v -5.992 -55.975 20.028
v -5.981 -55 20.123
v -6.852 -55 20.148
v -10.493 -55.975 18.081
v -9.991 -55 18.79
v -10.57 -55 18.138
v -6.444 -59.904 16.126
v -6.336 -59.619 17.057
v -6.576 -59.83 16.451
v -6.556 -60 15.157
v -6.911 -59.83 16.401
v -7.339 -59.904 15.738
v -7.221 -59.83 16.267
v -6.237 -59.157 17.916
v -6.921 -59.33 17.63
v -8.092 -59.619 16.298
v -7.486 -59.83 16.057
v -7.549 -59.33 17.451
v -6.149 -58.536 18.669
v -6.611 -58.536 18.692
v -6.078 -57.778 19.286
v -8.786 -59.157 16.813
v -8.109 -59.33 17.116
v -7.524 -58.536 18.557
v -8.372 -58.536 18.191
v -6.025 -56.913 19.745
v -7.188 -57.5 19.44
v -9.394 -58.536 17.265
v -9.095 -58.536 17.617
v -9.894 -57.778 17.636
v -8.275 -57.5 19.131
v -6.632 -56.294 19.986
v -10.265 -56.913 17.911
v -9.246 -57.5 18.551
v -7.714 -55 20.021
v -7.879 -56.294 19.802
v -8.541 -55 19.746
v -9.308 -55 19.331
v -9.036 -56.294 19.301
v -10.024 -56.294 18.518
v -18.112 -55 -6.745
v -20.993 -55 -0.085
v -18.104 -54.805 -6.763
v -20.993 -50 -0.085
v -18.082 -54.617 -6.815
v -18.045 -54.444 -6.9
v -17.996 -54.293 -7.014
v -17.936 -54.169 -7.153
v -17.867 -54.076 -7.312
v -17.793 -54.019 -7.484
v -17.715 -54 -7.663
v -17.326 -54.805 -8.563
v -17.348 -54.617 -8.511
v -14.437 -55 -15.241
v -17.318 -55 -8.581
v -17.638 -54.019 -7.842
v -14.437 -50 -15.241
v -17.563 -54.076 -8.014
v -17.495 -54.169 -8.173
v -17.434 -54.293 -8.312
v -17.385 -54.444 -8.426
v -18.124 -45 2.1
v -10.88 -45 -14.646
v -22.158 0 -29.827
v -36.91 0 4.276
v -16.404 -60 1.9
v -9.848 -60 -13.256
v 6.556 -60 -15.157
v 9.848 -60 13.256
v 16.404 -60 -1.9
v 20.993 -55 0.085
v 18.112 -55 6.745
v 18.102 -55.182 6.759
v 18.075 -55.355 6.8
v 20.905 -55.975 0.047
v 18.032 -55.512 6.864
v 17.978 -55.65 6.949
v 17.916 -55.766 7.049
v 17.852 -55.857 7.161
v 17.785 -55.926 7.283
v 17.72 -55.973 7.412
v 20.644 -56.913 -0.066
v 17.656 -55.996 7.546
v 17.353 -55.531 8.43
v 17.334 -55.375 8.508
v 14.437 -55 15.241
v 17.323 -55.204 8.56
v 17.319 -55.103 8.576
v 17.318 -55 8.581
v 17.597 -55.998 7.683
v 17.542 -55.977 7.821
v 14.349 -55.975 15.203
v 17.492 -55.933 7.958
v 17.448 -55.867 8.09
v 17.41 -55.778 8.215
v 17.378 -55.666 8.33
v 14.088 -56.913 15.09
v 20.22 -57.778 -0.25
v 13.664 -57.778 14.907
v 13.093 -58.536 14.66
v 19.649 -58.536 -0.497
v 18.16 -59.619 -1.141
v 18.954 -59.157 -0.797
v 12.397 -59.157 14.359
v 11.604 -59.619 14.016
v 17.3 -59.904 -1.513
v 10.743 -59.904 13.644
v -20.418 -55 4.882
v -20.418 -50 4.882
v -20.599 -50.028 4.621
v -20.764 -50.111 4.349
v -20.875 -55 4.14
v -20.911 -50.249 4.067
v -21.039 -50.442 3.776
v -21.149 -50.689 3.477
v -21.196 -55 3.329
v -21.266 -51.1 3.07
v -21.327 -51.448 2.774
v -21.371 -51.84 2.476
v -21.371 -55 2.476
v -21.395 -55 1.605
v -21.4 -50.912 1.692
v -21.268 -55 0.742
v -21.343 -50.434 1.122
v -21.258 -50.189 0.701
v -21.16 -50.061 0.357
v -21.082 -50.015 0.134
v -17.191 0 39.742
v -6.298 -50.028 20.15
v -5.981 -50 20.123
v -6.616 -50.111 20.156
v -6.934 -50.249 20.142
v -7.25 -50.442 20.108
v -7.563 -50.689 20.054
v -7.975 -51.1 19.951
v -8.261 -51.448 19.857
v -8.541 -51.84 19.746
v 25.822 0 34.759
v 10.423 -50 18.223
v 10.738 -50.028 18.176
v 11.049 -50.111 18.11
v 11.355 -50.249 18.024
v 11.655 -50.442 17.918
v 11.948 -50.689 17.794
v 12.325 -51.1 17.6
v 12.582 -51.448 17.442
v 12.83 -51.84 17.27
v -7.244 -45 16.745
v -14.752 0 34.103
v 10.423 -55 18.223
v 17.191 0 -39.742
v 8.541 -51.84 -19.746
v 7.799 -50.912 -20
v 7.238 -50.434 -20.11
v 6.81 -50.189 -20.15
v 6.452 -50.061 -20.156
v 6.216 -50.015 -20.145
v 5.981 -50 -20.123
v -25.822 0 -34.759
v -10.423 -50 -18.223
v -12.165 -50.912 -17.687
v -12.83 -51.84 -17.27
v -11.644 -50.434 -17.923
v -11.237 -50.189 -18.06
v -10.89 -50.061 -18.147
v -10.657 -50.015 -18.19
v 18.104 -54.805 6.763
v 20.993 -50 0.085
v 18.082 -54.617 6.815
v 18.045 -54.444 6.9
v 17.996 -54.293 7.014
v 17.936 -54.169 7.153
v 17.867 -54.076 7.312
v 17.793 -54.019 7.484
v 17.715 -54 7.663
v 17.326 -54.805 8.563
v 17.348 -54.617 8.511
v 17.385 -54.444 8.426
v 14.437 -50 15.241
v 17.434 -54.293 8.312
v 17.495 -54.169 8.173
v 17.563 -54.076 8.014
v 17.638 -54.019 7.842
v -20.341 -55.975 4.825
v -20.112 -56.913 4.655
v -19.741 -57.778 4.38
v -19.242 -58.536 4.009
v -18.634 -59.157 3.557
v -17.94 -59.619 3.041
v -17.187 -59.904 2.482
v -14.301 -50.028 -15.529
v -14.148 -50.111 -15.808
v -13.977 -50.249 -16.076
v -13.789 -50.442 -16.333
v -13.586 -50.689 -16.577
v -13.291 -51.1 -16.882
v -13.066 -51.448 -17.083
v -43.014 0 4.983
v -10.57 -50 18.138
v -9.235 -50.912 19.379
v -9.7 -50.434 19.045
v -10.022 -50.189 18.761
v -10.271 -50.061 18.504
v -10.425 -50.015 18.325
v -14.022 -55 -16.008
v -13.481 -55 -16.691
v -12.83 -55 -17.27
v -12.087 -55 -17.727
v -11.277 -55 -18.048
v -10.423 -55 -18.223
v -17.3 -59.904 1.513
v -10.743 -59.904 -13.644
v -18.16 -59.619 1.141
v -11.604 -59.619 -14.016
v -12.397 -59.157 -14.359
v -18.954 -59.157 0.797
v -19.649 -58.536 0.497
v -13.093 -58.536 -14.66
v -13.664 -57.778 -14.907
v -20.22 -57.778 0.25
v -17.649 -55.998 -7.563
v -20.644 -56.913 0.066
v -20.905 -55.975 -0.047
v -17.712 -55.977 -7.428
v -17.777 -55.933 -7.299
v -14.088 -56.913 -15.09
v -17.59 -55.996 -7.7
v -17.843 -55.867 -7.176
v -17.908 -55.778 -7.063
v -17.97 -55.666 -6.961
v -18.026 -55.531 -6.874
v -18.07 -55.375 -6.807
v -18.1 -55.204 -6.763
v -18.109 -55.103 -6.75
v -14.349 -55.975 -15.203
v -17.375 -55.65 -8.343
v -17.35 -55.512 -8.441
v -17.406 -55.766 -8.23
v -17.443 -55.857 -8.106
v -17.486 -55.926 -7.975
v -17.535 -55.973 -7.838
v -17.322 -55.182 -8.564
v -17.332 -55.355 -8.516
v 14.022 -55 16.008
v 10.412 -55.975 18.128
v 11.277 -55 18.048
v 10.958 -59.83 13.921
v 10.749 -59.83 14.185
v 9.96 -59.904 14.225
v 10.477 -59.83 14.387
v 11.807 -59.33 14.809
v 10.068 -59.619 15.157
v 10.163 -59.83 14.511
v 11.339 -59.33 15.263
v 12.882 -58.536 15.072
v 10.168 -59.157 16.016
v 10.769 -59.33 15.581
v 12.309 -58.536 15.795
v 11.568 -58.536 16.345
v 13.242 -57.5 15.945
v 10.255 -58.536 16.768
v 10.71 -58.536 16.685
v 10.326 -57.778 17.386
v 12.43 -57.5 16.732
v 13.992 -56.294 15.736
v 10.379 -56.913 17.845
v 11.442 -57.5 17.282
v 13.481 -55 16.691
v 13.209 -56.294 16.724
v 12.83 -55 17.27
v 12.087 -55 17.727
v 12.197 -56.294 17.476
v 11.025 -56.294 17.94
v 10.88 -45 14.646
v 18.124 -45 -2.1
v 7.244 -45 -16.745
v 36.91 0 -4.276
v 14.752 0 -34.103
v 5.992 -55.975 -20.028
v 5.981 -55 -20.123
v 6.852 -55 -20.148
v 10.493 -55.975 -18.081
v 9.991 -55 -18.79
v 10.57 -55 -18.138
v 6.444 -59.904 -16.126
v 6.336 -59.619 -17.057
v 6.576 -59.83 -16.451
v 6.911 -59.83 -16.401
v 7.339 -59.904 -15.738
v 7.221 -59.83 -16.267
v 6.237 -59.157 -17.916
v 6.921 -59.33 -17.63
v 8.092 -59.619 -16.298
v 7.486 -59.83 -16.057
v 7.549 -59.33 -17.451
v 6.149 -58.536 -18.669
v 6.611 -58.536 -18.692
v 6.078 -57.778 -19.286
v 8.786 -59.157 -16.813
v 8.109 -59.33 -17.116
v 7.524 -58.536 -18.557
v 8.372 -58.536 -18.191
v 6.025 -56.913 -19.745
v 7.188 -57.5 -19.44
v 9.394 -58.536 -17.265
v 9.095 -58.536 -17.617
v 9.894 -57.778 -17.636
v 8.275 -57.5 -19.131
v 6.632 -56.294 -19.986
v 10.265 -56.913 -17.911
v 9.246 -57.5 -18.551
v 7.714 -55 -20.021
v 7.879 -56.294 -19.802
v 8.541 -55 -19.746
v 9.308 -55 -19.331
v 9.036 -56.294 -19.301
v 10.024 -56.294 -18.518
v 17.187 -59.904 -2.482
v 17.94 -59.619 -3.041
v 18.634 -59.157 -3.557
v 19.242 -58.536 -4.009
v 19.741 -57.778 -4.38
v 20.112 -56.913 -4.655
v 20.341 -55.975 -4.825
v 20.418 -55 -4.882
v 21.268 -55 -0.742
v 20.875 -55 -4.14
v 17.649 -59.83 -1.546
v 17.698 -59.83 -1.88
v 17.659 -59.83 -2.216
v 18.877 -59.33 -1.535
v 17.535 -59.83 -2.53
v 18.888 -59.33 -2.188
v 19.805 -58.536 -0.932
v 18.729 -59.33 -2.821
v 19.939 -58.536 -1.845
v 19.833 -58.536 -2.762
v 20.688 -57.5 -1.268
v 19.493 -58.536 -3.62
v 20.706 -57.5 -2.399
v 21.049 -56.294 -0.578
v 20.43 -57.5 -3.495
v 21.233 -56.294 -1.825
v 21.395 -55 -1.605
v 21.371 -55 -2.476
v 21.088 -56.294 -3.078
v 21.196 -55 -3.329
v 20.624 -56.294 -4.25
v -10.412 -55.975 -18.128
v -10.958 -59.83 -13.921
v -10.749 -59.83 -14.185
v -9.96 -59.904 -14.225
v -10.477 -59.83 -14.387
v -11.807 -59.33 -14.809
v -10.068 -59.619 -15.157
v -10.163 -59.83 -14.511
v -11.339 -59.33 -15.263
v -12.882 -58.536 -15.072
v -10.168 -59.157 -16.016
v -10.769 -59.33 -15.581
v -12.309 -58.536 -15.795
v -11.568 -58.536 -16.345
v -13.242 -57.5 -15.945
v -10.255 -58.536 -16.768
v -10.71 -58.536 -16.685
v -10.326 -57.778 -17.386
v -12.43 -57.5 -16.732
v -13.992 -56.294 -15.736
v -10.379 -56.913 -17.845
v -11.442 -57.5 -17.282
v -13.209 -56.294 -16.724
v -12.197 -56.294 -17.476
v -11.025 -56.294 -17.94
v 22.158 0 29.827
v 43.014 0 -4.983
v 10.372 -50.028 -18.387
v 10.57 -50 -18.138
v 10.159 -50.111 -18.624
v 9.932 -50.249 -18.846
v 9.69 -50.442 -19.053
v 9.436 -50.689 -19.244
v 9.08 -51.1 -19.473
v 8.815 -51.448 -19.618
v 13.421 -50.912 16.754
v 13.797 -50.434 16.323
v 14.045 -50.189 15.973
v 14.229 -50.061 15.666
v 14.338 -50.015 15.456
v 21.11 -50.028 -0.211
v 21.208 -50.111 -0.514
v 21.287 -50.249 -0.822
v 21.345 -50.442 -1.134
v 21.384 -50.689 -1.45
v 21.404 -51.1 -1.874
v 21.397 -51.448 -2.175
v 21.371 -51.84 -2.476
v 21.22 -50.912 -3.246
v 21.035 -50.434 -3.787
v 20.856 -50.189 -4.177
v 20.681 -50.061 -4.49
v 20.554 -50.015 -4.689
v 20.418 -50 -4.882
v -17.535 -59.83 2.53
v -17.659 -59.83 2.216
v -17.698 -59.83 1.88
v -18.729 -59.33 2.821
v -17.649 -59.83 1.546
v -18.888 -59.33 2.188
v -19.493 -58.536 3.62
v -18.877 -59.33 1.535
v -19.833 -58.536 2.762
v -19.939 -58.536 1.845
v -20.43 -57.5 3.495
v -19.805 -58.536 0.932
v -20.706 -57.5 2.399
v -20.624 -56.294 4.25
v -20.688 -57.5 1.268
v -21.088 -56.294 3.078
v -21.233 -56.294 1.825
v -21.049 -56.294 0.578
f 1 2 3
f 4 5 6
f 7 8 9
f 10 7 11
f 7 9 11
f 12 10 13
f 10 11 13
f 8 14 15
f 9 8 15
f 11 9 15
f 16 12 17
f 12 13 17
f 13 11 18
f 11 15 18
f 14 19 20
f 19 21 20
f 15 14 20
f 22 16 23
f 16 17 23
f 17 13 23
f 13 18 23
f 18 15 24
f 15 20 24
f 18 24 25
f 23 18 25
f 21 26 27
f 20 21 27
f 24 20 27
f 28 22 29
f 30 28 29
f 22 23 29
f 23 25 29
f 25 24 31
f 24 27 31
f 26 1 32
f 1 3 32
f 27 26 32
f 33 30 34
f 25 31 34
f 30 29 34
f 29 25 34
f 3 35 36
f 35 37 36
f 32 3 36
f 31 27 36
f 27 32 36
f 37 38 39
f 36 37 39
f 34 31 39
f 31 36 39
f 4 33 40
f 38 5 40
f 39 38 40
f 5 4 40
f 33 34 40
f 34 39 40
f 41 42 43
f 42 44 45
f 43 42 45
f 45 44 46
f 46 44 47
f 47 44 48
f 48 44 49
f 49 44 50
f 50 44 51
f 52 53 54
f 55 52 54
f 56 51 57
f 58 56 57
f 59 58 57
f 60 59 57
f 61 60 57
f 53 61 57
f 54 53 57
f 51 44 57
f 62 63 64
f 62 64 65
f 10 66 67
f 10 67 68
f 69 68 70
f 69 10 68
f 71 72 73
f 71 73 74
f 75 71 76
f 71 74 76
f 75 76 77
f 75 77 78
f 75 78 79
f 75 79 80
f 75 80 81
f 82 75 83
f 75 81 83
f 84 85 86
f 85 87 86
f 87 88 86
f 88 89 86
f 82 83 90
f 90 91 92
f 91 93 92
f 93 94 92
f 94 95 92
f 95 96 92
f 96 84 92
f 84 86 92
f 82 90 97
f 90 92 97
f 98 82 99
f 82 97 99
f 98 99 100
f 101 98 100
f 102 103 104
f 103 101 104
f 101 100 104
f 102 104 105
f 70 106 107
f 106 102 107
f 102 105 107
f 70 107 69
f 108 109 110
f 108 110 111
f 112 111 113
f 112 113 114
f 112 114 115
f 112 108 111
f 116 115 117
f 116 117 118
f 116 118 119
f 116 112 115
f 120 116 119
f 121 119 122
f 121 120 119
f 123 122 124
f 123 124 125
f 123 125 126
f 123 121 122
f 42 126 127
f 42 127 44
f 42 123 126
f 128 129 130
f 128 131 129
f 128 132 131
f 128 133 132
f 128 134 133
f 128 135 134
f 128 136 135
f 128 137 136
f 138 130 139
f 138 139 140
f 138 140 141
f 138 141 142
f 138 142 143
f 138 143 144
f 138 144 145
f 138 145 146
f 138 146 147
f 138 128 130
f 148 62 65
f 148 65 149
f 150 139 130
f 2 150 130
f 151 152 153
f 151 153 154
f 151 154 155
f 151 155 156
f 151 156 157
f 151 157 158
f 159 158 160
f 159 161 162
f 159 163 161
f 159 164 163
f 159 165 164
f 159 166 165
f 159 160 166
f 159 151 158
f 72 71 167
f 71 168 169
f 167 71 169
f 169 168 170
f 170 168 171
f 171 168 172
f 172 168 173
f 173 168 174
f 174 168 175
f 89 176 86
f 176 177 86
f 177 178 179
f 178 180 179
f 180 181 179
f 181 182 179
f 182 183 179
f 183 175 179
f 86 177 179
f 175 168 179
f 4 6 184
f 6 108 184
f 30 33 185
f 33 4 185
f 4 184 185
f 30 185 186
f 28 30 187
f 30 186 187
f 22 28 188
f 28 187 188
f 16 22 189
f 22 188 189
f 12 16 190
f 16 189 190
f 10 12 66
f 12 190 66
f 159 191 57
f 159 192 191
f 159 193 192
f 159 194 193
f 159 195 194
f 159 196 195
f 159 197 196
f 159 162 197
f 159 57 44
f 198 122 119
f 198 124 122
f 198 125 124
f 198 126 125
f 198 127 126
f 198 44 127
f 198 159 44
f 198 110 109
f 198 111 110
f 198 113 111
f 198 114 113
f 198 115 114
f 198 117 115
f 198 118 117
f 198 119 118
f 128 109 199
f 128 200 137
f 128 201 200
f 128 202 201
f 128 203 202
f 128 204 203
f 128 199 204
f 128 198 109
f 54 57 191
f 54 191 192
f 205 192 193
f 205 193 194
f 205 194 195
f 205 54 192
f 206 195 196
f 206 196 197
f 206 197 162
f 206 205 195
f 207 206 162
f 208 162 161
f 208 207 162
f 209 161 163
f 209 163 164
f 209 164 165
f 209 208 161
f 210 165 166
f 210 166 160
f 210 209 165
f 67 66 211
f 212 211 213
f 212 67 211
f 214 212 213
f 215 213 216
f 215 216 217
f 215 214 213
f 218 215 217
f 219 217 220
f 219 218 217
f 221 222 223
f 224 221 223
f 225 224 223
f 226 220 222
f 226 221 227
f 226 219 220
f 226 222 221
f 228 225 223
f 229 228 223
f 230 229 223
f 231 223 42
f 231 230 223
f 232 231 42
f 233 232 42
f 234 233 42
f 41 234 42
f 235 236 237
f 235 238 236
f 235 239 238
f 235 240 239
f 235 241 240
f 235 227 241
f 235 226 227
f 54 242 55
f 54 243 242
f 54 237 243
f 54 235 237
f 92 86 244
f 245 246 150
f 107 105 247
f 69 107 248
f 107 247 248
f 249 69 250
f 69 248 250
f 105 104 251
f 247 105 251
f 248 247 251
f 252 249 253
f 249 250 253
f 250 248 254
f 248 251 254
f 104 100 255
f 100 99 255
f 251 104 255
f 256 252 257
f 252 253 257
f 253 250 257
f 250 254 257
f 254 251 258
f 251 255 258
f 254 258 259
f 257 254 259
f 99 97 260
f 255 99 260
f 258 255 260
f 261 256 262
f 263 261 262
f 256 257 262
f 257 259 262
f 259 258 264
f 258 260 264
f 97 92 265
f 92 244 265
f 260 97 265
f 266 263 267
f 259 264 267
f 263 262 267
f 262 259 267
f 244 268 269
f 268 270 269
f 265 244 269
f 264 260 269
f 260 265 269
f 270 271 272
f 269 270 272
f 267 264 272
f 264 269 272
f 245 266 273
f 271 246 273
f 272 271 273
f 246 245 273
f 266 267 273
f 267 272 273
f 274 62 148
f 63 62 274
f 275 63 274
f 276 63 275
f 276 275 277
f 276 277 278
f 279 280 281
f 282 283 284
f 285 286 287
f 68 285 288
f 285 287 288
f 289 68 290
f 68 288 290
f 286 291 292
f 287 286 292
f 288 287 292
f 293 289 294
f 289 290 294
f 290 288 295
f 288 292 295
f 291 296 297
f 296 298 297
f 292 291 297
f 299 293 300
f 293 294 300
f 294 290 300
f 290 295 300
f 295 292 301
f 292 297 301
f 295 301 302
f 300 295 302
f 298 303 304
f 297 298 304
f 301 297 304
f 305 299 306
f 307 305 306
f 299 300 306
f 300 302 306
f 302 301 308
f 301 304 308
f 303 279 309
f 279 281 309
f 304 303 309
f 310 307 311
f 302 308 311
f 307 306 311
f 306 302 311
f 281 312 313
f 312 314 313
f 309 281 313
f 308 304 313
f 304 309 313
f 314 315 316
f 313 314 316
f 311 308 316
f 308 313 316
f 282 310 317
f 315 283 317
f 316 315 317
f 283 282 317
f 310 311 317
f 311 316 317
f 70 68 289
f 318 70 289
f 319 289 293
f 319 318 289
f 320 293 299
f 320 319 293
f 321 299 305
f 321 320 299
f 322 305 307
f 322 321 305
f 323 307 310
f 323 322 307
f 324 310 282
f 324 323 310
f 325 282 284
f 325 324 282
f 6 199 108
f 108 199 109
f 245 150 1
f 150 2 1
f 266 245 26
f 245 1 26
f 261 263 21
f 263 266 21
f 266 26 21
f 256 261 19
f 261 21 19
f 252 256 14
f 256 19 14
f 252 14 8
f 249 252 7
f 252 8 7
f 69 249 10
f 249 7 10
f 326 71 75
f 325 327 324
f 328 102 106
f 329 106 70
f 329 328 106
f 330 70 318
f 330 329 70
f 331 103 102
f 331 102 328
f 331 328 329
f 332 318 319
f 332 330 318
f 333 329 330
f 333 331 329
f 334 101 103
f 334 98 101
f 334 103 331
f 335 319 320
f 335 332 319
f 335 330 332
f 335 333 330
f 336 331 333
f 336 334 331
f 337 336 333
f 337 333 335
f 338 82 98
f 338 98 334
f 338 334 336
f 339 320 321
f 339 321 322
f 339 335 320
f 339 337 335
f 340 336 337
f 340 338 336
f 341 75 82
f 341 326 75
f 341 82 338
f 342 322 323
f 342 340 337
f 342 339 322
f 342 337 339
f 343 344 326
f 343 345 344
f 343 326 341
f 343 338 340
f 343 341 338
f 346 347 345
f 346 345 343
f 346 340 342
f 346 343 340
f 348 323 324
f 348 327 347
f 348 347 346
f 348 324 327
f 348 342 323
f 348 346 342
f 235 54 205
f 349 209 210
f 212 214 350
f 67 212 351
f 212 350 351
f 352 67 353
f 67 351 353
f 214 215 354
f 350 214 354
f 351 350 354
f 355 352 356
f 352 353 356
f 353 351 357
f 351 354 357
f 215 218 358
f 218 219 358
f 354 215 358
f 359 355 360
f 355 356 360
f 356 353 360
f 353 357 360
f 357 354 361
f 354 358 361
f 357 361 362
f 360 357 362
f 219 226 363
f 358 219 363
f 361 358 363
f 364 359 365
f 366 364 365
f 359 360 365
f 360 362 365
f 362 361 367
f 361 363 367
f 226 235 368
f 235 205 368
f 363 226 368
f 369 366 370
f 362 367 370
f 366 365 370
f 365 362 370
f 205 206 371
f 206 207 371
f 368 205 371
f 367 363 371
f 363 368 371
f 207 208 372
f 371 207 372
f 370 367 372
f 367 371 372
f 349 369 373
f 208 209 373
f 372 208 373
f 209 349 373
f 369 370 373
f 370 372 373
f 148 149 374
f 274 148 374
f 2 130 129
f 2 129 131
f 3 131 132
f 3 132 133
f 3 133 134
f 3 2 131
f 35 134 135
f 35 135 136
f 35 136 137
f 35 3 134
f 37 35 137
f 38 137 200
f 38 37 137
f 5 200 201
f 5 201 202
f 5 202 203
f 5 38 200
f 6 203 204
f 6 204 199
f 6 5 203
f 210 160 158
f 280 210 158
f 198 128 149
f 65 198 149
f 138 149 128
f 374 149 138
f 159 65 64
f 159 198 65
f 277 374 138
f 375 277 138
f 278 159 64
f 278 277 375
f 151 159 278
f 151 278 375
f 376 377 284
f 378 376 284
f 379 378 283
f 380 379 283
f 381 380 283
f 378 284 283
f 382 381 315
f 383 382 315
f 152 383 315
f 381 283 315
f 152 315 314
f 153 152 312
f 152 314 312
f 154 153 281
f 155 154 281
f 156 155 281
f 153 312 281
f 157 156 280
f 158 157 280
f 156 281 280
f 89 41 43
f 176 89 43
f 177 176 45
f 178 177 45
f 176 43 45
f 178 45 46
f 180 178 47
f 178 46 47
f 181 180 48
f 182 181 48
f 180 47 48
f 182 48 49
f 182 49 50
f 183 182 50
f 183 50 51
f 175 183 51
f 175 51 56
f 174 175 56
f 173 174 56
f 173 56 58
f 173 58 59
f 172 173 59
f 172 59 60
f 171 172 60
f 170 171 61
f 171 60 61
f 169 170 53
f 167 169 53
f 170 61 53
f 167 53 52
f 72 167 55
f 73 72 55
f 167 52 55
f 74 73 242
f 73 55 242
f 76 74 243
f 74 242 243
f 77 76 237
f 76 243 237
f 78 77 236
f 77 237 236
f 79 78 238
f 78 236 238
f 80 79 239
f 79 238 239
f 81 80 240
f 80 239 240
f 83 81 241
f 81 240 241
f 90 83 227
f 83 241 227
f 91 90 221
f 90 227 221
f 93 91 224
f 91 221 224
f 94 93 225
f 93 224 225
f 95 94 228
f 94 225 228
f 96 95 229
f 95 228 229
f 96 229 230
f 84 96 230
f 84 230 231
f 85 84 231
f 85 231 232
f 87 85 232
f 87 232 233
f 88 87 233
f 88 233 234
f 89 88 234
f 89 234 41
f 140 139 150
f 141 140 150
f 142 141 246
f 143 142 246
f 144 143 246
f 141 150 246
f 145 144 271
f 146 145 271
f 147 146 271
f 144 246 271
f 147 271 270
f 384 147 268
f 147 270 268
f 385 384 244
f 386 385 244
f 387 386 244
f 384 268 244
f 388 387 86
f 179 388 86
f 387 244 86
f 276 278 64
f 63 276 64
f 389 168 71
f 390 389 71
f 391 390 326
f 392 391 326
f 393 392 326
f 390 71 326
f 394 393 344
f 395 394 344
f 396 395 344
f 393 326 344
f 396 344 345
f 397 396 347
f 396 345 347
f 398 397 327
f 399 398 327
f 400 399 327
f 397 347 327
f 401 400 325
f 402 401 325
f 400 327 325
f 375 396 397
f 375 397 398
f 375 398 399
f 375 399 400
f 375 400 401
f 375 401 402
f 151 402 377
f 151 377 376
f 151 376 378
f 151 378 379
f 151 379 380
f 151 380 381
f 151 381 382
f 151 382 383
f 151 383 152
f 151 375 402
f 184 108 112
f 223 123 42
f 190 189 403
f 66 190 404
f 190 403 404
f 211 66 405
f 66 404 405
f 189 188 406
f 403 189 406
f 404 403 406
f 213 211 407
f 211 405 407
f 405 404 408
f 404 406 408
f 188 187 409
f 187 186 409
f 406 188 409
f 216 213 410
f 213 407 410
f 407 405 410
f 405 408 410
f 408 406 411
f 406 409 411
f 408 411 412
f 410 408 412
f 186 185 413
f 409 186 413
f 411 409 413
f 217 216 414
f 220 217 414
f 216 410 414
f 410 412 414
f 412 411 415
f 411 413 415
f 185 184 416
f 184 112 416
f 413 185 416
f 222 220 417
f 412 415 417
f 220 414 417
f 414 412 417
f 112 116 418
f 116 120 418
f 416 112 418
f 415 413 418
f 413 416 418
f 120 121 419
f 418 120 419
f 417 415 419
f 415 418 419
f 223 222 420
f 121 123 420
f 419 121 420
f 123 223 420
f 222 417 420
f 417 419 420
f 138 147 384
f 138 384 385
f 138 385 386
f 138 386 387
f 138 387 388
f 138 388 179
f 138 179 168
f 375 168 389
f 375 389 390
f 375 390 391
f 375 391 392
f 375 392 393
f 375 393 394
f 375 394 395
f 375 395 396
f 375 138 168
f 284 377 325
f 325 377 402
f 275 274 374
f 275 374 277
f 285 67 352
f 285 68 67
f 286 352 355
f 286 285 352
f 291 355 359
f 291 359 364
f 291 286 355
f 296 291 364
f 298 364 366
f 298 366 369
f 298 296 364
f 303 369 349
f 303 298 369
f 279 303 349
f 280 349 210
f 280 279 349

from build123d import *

# Parameters (mm, degrees)
BOSS_EXTRUDE1_DEPTH = 50
BOSS_EXTRUDE1_DRAFT = -20
SHELL3_T            = -5
BOSS_EXTRUDE3_DEPTH = 10
FILLET2_R           = 5
SKETCH12_R          = 1
CUT_EXTRUDE1_DEPTH  = 98.648600839


with BuildPart() as part:
    # Sketch3 → Boss-Extrude1 (with draft: the straight prism first)
    with BuildSketch(Plane(origin=(0, 0, 0), x_dir=(1, 0, 0), z_dir=(0, 1, 0))):
        Polygon((43.013605704, 4.982943342), (17.191447333, 39.742346919), (-25.822158371, 34.759403577), (-43.013605704, -4.982943342), (-17.191447333, -39.742346919), (25.822158371, -34.759403577), align=None)
    extrude(amount=-BOSS_EXTRUDE1_DEPTH)
    # Boss-Extrude1: the draft: its side faces are tilted about the plane it starts from
    boss_extrude1_sides = [part.faces().sort_by_distance(p)[0] for p in [
        (30.102526518, -25, -22.36264513),
        (-4.315355519, -25, -37.250875248),
        (-34.417882038, -25, -14.888230118),
        (-30.102526518, -25, 22.36264513),
        (4.315355519, -25, 37.250875248),
        (34.417882038, -25, 14.888230118),
    ]]
    draft(boss_extrude1_sides, Plane(origin=(0, 0, 0), x_dir=(1, 0, 0), z_dir=(0, 1, 0)), BOSS_EXTRUDE1_DRAFT)

    # Shell3
    shell3_openings = [part.faces().sort_by_distance(p)[0] for p in [
        (0, 0, 0),
    ]]
    offset(amount=SHELL3_T, openings=shell3_openings, kind=Kind.INTERSECTION)

    # Sketch11 → Boss-Extrude3 (add)
    with BuildSketch(Plane.XZ.offset(50)):
        Polygon((13.290828996, 17.890885893), (-8.848547182, 20.455638494), (-22.139376178, 2.564752601), (-13.290828996, -17.890885893), (8.848547182, -20.455638494), (22.139376178, -2.564752601), align=None)
    extrude(amount=BOSS_EXTRUDE3_DEPTH)

    # Fillet2
    fillet2_edges = [part.edges().sort_by_distance(p)[0] for p in [
        (22.139376178, -55, -2.564752601),
        (13.290828996, -55, 17.890885893),
        (-8.848547182, -55, 20.455638494),
        (-22.139376178, -55, 2.564752601),
        (-13.290828996, -55, -17.890885893),
        (8.848547182, -55, -20.455638494),
        (17.715102587, -60, 7.663066646),
        (2.221140907, -60, 19.173262194),
        (-15.49396168, -60, 11.510195548),
        (-17.715102587, -60, -7.663066646),
        (-2.221140907, -60, -19.173262194),
        (15.49396168, -60, -11.510195548),
    ]]
    fillet(fillet2_edges, radius=FILLET2_R)

    # Sketch12 → Cut-Extrude1 (cut, through all)
    with BuildSketch(Plane(origin=(-17.715102587, 0, -7.663066646), x_dir=(-0.39701946980837655, 0, 0.9178101876712176), z_dir=(-0.9178101876712177, 0, -0.3970194698083766))):
        with Locations((0, -55)):
            Circle(SKETCH12_R)
    extrude(amount=-CUT_EXTRUDE1_DEPTH, mode=Mode.SUBTRACT)


solid = part.part
